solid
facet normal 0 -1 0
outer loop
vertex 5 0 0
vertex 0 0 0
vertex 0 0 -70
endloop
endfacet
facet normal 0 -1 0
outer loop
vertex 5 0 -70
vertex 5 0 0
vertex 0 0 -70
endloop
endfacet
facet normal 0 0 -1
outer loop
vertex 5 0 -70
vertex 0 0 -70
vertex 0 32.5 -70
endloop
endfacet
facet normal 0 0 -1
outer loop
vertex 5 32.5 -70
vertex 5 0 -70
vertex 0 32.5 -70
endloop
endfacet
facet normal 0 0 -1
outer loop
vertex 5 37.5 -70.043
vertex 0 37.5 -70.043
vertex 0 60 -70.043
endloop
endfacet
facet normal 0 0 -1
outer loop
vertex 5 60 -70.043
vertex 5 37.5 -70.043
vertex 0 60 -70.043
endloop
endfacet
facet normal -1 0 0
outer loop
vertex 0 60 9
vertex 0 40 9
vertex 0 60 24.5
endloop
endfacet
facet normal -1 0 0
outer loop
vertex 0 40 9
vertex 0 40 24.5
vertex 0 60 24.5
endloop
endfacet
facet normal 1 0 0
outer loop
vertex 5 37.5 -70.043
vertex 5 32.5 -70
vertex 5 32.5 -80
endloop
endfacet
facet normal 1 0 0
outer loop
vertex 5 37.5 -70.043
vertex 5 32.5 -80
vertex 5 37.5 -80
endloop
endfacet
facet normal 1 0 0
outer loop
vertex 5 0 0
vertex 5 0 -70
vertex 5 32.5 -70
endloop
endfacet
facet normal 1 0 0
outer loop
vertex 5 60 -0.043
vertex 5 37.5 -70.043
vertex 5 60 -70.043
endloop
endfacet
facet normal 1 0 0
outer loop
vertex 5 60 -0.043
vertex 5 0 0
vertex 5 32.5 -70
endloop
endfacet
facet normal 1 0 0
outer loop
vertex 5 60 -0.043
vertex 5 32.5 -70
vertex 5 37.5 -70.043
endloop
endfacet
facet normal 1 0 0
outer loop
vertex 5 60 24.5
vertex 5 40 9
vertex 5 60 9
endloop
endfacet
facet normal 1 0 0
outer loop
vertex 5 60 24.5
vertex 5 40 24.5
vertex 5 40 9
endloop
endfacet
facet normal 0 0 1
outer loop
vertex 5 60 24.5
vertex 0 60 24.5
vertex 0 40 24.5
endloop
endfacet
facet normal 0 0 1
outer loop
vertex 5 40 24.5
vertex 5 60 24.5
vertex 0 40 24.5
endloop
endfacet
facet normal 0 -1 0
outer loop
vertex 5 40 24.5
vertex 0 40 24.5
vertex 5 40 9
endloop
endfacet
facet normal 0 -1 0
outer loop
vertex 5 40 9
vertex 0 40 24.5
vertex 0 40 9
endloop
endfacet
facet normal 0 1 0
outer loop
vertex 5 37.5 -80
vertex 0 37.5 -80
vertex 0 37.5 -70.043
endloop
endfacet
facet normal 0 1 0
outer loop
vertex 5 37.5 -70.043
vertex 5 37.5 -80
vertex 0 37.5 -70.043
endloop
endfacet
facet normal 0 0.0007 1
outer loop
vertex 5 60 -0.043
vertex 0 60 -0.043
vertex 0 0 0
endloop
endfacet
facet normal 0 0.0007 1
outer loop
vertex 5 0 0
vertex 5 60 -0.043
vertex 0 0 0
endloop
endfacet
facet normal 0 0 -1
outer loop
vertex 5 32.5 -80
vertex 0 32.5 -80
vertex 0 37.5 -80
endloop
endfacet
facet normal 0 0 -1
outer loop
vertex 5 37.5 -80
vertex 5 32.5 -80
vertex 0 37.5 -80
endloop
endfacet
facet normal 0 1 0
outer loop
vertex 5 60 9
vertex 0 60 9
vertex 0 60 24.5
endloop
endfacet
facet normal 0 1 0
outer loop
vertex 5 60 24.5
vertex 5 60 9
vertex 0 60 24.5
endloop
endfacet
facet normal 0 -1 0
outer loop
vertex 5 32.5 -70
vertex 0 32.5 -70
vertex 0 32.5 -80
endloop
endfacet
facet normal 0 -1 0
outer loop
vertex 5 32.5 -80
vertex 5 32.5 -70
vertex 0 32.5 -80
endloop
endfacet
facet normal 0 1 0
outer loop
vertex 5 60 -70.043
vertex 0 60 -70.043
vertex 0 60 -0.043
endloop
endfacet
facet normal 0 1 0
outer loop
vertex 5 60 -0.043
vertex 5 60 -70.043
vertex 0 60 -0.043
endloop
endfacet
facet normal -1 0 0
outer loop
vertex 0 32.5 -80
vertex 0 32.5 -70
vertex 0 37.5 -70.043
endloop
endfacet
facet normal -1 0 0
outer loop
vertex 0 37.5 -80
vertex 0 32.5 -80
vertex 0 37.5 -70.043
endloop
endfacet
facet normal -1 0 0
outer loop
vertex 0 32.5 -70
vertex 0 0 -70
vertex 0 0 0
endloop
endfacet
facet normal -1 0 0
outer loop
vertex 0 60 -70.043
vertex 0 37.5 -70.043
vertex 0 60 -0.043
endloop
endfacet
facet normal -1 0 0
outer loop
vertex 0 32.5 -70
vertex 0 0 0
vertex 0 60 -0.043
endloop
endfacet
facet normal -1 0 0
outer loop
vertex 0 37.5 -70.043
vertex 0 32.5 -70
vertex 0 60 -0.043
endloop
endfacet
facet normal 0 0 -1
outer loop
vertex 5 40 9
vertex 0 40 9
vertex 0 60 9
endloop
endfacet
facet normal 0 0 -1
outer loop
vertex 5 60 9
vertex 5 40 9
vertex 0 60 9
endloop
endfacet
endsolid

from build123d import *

# Parameters (mm, degrees)
F1_DEPTH = 5


# Not quite as in the source:
# - a feature names something its author has since deleted; it is built from what else it names


with BuildPart() as f1:
    # F0 (on Right) → F1 (new body)
    with BuildSketch(Plane.YZ):
        Polygon((60, -0.0434386059), (0, 0), (0, -70), (12, -70), (12.4011761725, -70), (32.5, -70), (32.5, -80), (37.5, -80), (37.5, -70.0434386059), (60, -70.0434386059), align=None)
    extrude(amount=F1_DEPTH)


with BuildPart() as f1b:
    # F0 (on Right) → F1, piece 2 (new body)
    with BuildSketch(Plane.YZ):
        Polygon((40, 8.9999613941), (42.5, 8.9999613941), (60, 8.9999613941), (60, 24.499980697), (42.5, 24.499980697), (40, 24.499980697), align=None)
    extrude(amount=F1_DEPTH)


solid = Compound([f1.part, f1b.part])
